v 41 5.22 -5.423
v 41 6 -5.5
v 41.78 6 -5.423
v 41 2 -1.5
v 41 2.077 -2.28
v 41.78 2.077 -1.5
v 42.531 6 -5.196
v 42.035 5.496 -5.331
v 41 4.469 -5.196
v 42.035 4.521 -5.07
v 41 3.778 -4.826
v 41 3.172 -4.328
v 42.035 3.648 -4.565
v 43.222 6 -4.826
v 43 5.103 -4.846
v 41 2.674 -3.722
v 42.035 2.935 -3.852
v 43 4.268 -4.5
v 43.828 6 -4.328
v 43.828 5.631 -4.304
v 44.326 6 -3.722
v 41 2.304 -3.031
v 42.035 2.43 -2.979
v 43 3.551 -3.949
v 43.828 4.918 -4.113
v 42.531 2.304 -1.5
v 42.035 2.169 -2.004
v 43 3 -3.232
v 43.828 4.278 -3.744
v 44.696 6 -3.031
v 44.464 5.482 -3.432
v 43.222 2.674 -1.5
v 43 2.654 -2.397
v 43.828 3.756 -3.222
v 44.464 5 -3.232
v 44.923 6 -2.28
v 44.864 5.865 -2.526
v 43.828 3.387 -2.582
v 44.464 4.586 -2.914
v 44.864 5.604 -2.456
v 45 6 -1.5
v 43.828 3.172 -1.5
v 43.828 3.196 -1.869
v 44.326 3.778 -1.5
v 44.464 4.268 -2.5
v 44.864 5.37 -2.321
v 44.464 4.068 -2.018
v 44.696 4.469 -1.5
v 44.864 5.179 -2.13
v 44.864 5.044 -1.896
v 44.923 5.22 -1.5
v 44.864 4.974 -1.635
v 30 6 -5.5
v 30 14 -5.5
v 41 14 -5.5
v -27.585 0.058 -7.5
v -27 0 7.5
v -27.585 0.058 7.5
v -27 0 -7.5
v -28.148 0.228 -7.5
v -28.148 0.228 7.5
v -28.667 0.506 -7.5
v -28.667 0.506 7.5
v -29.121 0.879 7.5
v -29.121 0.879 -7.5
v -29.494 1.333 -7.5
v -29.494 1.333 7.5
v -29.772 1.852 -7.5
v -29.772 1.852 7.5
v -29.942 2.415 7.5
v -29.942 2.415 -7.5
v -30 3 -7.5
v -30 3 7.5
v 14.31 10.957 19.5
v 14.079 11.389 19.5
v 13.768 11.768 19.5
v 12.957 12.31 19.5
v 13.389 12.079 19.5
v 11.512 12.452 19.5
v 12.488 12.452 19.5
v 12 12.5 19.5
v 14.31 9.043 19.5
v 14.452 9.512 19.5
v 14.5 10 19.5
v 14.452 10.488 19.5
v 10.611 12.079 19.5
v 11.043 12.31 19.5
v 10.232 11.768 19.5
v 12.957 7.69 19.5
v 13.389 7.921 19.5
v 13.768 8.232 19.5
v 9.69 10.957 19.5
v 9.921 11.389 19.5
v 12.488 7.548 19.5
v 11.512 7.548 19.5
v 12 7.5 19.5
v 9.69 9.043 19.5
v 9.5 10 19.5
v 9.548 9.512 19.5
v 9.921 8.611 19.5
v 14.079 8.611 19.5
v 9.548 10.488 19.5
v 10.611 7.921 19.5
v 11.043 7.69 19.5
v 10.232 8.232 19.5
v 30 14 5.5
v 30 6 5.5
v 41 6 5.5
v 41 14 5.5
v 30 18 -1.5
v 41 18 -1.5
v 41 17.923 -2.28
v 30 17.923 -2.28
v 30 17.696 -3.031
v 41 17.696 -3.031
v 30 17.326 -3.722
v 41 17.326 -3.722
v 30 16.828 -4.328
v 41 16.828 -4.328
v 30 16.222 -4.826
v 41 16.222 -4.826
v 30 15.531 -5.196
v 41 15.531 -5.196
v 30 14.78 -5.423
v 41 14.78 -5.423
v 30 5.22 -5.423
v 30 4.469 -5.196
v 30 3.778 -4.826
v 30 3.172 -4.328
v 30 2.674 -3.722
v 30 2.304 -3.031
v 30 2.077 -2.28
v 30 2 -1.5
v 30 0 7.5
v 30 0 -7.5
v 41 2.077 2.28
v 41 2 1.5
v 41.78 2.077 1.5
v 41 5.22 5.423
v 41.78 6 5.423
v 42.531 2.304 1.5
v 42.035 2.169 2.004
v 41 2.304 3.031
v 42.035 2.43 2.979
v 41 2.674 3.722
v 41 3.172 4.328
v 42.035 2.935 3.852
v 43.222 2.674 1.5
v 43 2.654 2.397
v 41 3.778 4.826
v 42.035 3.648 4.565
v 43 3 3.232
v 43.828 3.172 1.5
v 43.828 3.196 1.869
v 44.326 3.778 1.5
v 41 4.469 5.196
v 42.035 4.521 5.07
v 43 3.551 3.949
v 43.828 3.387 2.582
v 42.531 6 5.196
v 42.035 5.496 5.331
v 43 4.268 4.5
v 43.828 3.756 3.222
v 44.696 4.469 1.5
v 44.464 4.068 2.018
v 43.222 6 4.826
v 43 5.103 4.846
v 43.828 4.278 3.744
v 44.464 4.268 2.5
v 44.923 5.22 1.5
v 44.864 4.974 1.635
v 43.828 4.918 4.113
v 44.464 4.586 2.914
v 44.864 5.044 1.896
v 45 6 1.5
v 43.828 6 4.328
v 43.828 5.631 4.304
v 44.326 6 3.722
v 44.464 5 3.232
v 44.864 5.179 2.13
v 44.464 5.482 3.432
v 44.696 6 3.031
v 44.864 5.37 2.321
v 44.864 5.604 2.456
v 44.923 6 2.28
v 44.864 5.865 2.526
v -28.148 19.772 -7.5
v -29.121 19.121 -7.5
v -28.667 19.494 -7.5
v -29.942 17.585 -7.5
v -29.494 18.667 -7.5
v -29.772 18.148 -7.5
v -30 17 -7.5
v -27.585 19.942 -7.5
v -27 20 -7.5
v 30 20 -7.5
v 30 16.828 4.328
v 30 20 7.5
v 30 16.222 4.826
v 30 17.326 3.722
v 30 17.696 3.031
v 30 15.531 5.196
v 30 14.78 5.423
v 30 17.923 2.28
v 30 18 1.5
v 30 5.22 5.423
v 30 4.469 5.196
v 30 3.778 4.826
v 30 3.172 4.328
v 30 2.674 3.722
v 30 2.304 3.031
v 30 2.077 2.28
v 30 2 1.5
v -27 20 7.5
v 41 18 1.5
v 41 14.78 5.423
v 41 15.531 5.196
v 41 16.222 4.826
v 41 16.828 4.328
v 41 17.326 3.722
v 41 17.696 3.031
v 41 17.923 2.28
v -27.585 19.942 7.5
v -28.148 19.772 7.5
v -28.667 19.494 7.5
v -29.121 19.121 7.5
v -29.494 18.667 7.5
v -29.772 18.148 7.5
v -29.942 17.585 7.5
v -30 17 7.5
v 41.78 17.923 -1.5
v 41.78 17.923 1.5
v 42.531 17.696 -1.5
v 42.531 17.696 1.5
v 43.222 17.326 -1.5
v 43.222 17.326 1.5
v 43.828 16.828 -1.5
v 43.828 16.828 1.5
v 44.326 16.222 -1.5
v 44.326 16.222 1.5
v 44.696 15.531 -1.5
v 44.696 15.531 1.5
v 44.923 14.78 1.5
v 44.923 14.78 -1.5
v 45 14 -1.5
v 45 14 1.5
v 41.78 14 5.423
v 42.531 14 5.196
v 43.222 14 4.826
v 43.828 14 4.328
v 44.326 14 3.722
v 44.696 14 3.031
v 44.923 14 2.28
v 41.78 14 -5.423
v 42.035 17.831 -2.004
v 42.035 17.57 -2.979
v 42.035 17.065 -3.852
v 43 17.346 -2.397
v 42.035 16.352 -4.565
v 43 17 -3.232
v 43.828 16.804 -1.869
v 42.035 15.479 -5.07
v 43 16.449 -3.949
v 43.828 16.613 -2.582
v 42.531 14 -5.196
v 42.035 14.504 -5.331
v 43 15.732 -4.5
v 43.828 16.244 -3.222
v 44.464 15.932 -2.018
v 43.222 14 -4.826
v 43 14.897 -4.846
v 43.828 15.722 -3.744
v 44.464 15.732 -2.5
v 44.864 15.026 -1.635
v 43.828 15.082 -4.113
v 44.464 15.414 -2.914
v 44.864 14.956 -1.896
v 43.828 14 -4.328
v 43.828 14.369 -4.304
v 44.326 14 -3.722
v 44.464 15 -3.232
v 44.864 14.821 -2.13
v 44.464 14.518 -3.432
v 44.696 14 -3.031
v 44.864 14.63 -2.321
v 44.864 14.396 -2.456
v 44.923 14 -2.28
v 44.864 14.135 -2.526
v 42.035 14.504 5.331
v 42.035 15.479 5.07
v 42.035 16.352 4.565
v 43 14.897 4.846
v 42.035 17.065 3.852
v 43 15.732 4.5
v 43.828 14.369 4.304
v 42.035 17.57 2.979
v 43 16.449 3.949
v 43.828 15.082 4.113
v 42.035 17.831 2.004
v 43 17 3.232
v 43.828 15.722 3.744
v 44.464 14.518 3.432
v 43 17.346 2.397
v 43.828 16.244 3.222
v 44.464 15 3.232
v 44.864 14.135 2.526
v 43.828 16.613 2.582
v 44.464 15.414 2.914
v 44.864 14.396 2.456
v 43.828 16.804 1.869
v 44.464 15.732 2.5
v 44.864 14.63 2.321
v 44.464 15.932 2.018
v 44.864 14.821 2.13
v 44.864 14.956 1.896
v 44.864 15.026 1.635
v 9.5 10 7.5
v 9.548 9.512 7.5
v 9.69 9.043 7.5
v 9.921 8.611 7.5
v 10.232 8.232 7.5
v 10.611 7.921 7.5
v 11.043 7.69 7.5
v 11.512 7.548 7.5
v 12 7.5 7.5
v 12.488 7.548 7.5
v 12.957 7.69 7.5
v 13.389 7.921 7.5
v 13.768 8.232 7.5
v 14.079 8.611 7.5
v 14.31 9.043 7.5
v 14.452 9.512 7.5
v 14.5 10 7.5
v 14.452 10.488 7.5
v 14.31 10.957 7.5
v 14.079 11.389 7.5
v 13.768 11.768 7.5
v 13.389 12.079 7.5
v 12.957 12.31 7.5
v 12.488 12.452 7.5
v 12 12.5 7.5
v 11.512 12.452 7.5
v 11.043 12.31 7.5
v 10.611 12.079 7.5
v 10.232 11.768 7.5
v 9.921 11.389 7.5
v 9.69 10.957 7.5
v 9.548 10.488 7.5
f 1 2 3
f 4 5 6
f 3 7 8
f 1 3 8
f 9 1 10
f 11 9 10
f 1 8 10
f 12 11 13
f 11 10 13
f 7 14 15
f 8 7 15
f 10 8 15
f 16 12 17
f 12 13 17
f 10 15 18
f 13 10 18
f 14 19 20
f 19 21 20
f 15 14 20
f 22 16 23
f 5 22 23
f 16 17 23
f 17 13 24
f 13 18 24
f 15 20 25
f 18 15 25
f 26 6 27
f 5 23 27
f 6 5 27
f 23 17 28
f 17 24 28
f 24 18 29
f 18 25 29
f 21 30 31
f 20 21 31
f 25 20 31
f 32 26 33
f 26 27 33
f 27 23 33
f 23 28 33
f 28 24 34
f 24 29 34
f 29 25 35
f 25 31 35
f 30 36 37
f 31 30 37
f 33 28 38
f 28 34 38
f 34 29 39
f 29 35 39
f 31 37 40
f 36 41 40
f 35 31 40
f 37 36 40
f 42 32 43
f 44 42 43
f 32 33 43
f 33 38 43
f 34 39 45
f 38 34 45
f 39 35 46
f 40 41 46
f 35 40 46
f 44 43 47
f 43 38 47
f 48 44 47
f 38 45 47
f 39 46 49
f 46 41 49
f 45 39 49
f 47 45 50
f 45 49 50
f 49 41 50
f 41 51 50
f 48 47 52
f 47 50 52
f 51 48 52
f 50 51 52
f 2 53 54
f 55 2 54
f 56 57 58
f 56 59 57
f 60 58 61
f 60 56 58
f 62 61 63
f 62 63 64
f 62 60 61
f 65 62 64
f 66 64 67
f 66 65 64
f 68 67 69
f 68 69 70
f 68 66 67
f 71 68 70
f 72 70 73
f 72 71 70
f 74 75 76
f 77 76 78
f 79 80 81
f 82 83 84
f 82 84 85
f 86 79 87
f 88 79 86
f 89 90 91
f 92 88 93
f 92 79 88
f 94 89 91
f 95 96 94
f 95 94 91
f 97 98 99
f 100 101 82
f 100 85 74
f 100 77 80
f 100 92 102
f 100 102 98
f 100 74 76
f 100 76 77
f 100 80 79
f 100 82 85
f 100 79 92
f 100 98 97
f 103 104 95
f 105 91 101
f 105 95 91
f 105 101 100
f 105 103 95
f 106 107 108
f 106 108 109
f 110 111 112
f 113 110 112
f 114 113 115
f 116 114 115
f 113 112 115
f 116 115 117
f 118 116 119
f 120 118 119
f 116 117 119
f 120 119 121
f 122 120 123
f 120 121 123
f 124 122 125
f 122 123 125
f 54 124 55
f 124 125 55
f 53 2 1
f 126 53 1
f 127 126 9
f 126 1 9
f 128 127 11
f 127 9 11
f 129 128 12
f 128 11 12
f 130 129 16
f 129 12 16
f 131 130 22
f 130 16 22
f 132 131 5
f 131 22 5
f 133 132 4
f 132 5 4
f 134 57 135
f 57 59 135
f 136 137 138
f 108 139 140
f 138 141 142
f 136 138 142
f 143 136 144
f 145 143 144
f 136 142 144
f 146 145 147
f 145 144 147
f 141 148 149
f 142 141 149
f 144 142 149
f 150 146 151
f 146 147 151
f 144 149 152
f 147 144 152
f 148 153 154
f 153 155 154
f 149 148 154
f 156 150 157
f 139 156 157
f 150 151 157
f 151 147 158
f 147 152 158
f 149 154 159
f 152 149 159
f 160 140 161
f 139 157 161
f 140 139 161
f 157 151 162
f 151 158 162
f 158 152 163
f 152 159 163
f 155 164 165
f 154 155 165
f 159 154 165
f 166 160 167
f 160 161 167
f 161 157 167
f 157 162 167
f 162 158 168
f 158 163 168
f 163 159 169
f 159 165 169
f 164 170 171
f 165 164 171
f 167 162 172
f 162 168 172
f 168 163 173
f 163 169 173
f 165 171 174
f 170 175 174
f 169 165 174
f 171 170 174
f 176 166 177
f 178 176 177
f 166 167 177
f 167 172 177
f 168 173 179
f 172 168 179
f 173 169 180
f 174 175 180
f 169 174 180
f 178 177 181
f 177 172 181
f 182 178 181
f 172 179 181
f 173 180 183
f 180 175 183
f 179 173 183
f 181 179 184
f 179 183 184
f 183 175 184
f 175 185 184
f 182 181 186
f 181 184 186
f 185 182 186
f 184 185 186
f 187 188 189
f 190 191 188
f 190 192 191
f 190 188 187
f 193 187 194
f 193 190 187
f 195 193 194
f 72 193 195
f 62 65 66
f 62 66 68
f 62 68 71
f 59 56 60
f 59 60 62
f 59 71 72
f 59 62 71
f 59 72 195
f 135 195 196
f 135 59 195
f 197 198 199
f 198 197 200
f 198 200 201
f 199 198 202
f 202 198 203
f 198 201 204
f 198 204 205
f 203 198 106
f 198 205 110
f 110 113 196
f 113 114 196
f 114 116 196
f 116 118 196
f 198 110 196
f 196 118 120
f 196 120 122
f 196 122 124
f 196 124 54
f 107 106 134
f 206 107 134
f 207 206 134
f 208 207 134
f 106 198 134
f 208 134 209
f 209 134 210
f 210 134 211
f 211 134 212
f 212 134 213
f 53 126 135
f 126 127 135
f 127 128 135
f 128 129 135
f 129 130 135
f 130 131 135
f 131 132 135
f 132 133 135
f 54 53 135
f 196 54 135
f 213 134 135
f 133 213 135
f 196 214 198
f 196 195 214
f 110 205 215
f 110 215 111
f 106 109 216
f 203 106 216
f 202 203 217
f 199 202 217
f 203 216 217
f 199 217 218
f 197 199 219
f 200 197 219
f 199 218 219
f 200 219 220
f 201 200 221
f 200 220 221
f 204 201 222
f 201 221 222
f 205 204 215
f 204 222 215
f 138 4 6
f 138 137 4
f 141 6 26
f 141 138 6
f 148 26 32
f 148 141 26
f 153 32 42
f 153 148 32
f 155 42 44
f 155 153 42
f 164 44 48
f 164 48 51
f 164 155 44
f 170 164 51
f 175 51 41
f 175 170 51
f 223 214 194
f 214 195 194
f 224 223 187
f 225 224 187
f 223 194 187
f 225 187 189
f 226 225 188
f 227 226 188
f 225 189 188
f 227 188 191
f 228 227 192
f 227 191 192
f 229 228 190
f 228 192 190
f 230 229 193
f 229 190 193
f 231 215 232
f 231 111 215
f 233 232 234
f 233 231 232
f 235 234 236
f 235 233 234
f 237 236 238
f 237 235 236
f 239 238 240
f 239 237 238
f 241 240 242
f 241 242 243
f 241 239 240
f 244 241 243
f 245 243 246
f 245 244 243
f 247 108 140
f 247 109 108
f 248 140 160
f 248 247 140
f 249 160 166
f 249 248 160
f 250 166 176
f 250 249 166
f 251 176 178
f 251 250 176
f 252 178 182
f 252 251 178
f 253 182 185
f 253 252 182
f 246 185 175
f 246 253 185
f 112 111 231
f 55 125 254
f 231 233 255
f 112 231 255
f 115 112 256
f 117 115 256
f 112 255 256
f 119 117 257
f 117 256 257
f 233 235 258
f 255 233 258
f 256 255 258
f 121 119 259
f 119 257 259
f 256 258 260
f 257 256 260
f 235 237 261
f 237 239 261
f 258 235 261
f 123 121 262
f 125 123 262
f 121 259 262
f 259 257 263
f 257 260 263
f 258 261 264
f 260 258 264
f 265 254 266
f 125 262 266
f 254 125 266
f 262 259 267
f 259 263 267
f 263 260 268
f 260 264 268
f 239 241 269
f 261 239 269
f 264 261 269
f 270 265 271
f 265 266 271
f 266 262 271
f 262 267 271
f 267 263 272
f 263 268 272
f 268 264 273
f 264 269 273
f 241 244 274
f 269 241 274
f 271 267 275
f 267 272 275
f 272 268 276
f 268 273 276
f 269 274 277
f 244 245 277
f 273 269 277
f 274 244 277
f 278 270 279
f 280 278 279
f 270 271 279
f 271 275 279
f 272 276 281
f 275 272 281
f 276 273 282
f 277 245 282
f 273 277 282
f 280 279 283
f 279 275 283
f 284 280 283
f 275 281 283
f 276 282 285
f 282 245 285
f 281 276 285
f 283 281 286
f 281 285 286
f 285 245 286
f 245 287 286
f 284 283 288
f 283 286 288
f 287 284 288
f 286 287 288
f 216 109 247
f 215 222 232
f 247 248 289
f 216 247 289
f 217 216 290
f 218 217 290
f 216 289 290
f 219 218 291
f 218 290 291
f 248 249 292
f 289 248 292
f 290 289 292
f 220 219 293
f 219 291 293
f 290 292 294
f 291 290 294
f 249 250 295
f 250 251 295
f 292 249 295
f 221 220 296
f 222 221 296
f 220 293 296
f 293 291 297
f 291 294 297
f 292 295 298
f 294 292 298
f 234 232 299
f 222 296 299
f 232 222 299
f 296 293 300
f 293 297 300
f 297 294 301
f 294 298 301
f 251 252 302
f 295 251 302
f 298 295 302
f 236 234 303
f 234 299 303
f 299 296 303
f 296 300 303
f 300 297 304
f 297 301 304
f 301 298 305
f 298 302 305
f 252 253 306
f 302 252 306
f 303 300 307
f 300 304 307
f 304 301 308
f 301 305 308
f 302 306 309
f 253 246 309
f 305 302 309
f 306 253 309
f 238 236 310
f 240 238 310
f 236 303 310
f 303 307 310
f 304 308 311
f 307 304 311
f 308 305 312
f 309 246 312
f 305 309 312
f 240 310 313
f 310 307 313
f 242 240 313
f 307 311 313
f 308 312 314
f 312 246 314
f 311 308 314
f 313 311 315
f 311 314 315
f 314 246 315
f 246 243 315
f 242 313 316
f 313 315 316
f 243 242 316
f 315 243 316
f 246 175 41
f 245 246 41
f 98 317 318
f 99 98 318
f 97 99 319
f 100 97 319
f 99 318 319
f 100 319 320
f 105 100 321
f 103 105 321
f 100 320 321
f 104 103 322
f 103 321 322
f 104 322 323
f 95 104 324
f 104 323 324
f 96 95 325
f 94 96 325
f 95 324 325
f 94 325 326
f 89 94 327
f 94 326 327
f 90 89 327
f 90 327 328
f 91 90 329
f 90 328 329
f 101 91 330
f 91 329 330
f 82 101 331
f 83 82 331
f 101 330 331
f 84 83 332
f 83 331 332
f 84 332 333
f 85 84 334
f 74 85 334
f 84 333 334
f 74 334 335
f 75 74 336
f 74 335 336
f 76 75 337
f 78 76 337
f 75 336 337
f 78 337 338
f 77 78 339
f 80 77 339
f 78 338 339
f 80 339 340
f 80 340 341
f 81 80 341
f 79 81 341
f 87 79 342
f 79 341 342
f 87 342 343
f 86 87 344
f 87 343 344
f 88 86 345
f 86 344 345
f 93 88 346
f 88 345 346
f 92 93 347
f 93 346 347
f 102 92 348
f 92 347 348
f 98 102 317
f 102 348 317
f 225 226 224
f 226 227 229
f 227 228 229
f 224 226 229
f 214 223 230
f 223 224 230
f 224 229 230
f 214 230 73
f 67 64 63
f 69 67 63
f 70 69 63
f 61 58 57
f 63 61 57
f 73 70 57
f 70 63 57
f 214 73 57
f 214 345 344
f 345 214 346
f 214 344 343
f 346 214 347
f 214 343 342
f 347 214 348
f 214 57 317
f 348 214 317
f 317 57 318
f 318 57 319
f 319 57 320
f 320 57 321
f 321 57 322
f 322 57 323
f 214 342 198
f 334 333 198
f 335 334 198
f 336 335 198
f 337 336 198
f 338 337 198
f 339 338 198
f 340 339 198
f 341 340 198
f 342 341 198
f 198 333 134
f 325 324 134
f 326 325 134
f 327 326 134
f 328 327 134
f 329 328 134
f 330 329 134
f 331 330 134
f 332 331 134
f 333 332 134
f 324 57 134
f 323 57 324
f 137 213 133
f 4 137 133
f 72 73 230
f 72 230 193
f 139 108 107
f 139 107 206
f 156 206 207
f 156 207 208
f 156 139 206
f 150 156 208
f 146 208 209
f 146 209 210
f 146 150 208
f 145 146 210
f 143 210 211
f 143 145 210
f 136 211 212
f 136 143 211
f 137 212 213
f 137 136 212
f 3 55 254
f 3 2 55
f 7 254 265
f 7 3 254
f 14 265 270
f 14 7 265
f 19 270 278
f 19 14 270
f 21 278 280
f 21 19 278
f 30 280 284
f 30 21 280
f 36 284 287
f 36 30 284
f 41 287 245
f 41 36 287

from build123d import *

# Parameters (mm, degrees)
SKETCH1_W           = 60
SKETCH1_H           = 15
BOSS_EXTRUDE1_DEPTH = 20
SKETCH2_R           = 2.5
BOSS_EXTRUDE2_DEPTH = 12
SKETCH3_W           = 11
SKETCH3_H           = 16
BOSS_EXTRUDE3_DEPTH = 15
FILLET1_R           = 4
FILLET2_R           = 4
FILLET3_R           = 3


with BuildPart() as part:
    # Sketch1 → Boss-Extrude1 (new body)
    with BuildSketch(Plane(origin=(0, 0, 0), x_dir=(1, 0, 0), z_dir=(0, 1, 0))):
        Rectangle(SKETCH1_W, SKETCH1_H)
    extrude(amount=BOSS_EXTRUDE1_DEPTH)

    # Sketch2 → Boss-Extrude2 (add)
    with BuildSketch(Plane.XY.offset(7.5)):
        with Locations(Location((12, 10, 0), (0, 0, 180))):
            Circle(SKETCH2_R)
    extrude(amount=BOSS_EXTRUDE2_DEPTH)

    # Sketch3 → Boss-Extrude3 (add)
    with BuildSketch(Plane(origin=(30, 0, 0), x_dir=(0, 0, -1), z_dir=(1, 0, 0))):
        with Locations((0, 10)):
            Rectangle(SKETCH3_W, SKETCH3_H)
    extrude(amount=BOSS_EXTRUDE3_DEPTH)

    # Fillet1
    fillet1_edges = [part.edges().sort_by_distance(p)[0] for p in [
        (37.5, 18, 5.5),
        (37.5, 2, 5.5),
        (37.5, 2, -5.5),
        (37.5, 18, -5.5),
    ]]
    fillet(fillet1_edges, radius=FILLET1_R)

    # Fillet2
    fillet2_edges = [part.edges().sort_by_distance(p)[0] for p in [
        (45, 10, 5.5),
        (45, 18, 0),
        (45, 2, 0),
        (45, 10, -5.5),
        (45, 3.171572875, 4.328427125),
        (45, 3.171572875, -4.328427125),
        (45, 16.828427125, -4.328427125),
        (45, 16.828427125, 4.328427125),
    ]]
    fillet(fillet2_edges, radius=FILLET2_R)

    # Fillet3
    fillet3_edges = [part.edges().sort_by_distance(p)[0] for p in [
        (-30, 20, 0),
        (-30, 0, 0),
    ]]
    fillet(fillet3_edges, radius=FILLET3_R)


solid = part.part
